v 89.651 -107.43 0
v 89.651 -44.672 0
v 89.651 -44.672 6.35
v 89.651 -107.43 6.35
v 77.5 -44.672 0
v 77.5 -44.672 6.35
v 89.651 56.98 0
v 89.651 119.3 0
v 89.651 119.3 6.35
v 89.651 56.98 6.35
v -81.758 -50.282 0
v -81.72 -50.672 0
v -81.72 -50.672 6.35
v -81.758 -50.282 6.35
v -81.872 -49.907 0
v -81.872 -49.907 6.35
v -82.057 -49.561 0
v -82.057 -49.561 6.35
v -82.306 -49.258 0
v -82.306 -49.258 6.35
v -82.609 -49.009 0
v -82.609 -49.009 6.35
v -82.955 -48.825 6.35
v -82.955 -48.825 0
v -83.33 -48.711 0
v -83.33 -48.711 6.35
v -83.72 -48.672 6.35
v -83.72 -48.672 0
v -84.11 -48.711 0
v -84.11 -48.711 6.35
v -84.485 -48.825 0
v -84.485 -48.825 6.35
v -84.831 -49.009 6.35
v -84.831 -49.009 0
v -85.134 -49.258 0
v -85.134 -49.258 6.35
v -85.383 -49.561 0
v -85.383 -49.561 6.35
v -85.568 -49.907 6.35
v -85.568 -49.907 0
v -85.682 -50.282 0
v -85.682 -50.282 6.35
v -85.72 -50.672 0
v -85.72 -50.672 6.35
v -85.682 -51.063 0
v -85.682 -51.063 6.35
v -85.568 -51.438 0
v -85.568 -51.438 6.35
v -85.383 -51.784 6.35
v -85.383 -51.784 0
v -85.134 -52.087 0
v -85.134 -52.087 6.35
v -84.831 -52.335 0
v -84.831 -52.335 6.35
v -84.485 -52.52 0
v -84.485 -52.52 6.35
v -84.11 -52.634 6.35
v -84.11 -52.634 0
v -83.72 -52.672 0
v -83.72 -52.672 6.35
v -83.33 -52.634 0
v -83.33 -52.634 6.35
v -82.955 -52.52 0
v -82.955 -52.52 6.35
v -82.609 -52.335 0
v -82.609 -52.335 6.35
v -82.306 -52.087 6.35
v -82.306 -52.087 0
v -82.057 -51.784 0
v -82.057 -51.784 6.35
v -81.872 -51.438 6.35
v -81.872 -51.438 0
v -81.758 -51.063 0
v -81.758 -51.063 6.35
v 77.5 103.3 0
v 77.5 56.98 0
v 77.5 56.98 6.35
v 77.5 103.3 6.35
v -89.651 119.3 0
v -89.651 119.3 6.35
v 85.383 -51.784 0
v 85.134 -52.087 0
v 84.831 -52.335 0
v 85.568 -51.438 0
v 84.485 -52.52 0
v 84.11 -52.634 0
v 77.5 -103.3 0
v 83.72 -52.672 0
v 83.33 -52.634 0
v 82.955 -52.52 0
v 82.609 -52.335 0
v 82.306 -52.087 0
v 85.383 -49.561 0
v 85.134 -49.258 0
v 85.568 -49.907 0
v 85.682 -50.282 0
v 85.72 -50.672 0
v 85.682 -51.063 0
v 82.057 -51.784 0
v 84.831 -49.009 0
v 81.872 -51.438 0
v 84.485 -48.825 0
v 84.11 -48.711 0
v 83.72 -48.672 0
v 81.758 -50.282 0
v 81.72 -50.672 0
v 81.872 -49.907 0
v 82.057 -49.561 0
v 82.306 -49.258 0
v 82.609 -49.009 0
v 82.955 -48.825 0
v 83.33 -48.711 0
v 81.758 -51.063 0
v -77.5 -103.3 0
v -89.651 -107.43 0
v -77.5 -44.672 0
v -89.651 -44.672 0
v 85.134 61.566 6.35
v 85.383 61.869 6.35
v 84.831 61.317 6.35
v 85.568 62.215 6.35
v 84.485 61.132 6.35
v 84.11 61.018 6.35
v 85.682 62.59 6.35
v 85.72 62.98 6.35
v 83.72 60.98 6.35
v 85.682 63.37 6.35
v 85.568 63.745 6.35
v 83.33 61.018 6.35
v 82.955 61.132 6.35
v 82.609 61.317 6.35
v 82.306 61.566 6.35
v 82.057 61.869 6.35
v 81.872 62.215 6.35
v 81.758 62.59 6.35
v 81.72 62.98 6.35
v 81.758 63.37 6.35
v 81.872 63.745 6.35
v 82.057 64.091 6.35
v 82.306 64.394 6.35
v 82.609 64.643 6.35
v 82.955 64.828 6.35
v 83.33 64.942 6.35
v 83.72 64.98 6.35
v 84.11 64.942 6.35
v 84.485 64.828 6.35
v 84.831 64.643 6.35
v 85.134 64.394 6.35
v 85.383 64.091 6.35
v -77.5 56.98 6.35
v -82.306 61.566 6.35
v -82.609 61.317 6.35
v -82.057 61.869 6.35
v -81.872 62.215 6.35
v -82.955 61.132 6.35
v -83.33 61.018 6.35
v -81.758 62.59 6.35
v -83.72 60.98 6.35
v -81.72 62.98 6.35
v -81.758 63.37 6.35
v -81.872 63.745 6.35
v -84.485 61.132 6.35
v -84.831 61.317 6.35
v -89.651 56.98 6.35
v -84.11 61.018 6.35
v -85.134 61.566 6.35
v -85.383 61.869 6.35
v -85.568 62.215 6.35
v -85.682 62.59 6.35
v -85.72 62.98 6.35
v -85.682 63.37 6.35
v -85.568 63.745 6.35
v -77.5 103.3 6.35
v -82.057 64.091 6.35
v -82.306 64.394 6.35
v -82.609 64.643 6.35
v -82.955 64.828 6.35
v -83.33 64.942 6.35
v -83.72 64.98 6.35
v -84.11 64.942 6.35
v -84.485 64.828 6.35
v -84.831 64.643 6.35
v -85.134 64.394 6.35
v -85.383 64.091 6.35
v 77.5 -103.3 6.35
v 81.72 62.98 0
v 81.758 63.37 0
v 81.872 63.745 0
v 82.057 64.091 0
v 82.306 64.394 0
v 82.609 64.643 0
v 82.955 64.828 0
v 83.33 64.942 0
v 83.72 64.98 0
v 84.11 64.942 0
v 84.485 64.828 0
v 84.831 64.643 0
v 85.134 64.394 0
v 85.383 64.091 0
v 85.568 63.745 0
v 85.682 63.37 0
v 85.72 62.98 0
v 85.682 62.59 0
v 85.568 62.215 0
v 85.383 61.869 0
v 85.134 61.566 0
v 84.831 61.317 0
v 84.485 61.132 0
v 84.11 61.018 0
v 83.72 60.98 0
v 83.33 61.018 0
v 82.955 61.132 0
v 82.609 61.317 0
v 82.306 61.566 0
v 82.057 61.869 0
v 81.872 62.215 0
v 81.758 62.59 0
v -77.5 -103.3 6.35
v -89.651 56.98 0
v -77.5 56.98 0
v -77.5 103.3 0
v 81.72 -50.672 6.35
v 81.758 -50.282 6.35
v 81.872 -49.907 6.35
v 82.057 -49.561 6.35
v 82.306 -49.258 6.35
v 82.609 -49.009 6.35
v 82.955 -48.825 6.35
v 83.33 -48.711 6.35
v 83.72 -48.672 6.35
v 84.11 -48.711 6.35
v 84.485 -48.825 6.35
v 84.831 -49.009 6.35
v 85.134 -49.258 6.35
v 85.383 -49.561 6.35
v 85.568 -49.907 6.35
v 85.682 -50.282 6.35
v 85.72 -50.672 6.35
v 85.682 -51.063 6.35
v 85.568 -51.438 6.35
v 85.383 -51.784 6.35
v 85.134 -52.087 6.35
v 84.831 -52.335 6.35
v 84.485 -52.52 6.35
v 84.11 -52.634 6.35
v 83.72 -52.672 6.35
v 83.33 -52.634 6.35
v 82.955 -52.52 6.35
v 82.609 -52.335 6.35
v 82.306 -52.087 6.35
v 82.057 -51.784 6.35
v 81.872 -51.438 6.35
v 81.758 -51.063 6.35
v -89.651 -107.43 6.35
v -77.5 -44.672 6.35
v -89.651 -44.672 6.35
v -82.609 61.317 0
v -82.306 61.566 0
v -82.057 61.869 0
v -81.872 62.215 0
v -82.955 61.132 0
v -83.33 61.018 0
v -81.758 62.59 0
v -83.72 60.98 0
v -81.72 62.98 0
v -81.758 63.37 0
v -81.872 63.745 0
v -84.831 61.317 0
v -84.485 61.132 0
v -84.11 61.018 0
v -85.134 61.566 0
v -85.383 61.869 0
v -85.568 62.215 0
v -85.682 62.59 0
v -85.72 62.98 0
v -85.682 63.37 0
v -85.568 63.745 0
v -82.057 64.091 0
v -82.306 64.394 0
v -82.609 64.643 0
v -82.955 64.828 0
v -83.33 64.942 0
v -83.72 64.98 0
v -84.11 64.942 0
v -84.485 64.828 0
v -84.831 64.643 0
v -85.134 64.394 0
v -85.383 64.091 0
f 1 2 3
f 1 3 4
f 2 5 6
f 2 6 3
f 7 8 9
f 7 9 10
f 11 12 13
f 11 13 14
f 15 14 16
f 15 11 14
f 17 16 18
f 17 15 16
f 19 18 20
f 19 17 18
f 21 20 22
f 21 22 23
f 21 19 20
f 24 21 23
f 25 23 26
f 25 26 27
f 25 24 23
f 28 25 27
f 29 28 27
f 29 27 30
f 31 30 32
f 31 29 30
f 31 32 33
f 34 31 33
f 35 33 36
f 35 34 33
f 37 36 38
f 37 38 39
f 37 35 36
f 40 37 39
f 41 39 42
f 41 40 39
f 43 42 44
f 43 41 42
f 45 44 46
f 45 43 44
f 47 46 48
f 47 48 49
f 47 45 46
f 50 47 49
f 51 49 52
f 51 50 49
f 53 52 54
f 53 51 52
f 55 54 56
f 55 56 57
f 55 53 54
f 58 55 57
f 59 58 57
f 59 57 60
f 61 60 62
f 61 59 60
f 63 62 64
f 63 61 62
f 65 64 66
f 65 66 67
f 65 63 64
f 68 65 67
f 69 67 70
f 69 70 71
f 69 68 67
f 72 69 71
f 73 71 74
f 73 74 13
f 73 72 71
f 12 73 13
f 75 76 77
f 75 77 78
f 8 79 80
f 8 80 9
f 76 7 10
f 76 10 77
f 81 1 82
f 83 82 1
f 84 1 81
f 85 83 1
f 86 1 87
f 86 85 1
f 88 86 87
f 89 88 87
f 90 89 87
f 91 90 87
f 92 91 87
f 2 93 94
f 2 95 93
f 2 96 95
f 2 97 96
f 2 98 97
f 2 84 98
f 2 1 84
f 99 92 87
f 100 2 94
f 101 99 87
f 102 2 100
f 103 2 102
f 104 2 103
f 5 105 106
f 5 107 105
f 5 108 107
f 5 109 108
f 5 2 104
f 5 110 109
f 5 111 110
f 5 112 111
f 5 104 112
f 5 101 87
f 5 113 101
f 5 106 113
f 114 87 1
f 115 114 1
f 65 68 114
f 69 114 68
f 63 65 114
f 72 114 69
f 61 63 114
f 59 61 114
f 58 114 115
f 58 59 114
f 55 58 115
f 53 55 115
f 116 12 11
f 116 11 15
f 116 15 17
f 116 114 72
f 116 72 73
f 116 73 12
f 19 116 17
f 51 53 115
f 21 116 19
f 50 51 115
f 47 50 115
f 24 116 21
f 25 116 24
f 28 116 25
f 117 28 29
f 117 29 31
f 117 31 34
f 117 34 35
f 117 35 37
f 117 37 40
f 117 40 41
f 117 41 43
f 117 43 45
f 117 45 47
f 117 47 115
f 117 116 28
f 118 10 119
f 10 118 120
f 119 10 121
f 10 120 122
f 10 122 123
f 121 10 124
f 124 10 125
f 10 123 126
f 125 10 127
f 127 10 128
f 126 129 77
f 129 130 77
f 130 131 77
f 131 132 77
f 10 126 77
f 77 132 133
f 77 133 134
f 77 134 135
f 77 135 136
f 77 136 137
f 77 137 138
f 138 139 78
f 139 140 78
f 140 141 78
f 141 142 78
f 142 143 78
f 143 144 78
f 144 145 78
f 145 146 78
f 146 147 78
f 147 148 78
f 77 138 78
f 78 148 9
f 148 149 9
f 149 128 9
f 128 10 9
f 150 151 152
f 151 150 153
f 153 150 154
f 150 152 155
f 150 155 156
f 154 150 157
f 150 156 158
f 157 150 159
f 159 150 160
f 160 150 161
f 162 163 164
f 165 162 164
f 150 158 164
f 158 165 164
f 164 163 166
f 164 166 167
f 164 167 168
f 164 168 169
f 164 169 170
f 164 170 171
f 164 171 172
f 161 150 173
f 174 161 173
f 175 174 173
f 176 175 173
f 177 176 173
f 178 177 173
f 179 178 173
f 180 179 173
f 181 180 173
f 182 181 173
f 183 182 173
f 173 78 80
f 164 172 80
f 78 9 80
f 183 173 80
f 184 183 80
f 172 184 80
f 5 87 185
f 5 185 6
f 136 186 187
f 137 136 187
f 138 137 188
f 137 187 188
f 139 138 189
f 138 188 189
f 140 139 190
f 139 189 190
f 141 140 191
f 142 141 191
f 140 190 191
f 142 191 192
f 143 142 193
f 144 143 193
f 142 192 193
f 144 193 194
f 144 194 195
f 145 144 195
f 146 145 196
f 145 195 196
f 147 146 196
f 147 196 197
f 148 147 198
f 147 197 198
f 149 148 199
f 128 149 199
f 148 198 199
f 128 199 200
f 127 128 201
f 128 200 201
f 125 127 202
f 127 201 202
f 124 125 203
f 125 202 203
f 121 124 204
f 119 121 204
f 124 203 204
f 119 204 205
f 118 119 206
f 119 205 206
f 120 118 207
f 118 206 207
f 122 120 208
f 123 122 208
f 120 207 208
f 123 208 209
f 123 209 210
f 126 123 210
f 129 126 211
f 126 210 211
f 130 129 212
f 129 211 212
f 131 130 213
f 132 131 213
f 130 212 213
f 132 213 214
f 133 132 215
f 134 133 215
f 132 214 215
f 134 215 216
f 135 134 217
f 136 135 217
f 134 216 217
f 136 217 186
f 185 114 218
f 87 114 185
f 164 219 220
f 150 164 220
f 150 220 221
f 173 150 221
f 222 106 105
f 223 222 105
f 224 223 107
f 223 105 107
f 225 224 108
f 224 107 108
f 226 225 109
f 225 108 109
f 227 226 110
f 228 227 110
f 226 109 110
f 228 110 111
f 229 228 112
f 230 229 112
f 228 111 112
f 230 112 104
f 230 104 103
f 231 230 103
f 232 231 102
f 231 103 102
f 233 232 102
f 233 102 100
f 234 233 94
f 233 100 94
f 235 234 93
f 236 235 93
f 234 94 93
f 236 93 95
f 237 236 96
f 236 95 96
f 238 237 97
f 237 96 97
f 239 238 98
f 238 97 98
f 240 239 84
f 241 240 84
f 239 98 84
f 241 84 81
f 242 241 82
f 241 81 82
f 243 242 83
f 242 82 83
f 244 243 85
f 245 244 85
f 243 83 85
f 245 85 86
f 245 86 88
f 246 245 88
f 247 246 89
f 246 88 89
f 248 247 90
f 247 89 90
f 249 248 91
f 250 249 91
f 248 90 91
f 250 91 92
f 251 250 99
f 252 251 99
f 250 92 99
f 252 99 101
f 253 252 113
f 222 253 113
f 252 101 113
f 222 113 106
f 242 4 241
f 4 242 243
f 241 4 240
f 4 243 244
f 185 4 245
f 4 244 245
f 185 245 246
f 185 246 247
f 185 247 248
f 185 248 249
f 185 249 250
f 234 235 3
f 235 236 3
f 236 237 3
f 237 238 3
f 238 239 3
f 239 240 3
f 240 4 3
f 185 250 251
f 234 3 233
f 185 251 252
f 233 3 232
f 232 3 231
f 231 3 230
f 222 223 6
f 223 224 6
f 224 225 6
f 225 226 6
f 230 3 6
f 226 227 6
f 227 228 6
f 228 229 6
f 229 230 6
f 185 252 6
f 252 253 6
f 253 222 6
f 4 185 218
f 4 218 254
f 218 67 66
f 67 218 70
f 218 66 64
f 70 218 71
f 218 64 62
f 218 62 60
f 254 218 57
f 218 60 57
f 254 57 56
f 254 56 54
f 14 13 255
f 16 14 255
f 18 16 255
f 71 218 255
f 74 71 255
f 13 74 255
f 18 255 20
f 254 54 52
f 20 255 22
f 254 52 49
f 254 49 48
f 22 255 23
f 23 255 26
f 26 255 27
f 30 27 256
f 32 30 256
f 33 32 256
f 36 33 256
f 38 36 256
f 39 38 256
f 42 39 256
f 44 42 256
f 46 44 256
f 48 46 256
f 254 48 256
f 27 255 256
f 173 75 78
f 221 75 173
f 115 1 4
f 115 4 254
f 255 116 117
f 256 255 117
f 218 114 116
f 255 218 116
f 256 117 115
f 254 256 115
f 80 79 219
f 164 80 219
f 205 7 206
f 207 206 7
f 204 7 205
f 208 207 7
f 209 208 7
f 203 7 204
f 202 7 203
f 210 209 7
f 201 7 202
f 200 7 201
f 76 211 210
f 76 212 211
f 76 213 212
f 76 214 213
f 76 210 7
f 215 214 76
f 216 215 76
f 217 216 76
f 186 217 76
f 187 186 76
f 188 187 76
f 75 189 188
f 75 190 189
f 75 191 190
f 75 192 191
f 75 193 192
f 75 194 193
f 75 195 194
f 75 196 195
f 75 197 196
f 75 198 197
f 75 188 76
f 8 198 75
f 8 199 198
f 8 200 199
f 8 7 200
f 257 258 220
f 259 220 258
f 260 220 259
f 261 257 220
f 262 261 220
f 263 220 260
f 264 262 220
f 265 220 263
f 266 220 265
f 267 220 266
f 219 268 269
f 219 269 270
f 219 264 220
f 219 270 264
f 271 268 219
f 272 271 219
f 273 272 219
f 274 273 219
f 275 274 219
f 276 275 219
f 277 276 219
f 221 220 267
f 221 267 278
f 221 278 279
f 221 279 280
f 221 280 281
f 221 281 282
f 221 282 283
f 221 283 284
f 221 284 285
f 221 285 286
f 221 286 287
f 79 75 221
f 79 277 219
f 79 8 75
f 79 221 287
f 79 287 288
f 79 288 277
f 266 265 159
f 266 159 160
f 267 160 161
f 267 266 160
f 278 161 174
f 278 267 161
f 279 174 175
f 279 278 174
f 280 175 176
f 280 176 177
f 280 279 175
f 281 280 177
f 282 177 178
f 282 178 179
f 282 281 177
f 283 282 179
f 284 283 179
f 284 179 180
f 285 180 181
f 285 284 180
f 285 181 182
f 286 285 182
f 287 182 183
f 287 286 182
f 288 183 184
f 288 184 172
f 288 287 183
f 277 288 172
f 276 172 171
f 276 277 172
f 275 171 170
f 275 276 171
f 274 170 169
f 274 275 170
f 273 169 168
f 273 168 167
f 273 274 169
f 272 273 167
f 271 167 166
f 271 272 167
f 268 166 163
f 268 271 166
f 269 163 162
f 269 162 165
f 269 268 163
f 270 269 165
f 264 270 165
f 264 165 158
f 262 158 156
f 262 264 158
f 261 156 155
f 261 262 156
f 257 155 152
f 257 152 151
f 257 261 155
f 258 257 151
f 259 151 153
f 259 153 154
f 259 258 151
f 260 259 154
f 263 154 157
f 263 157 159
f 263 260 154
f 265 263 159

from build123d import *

# Parameters (mm, degrees)
SKETCH1_R               = 2
REPEATING_FRAME_DEPTH   = 6.35
REPEATING_FRAME_2_DEPTH = 6.35


with BuildPart() as part:
    # Sketch1 → Repeating Frame (new body)
    with BuildSketch(Plane.XY):
        Polygon((-89.6514, -107.43), (0, -107.43), (0, -103.3), (-77.5, -103.3), (-77.5, -44.6724), (-89.6514, -44.6724), align=None)
        with Locations((-83.72, -50.6724)):
            Circle(SKETCH1_R, mode=Mode.SUBTRACT)
    repeating_frame = extrude(amount=REPEATING_FRAME_DEPTH)


with BuildPart() as body_2:
    # Sketch1 → Repeating Frame 2 (new body)
    with BuildSketch(Plane.XY):
        Polygon((-77.5, 103.3), (0, 103.3), (0, 119.3), (-89.6514, 119.3), (-89.6514, 56.98), (-77.5, 56.98), align=None)
        with Locations((-83.72, 62.98)):
            Circle(SKETCH1_R, mode=Mode.SUBTRACT)
    repeating_frame_2 = extrude(amount=REPEATING_FRAME_2_DEPTH)


with BuildPart() as part_1:
    add(part.part)

    add(body_2.part)  # Mirror1 merges body 2
    # Mirror1: Repeating Frame, Repeating Frame 2 across plane
    add(repeating_frame.mirror(Plane(origin=(0, 0, 0), x_dir=(0, 0, 1), z_dir=(1, 0, 0))))
    add(repeating_frame_2.mirror(Plane(origin=(0, 0, 0), x_dir=(0, 0, 1), z_dir=(1, 0, 0))))


solid = part_1.part
